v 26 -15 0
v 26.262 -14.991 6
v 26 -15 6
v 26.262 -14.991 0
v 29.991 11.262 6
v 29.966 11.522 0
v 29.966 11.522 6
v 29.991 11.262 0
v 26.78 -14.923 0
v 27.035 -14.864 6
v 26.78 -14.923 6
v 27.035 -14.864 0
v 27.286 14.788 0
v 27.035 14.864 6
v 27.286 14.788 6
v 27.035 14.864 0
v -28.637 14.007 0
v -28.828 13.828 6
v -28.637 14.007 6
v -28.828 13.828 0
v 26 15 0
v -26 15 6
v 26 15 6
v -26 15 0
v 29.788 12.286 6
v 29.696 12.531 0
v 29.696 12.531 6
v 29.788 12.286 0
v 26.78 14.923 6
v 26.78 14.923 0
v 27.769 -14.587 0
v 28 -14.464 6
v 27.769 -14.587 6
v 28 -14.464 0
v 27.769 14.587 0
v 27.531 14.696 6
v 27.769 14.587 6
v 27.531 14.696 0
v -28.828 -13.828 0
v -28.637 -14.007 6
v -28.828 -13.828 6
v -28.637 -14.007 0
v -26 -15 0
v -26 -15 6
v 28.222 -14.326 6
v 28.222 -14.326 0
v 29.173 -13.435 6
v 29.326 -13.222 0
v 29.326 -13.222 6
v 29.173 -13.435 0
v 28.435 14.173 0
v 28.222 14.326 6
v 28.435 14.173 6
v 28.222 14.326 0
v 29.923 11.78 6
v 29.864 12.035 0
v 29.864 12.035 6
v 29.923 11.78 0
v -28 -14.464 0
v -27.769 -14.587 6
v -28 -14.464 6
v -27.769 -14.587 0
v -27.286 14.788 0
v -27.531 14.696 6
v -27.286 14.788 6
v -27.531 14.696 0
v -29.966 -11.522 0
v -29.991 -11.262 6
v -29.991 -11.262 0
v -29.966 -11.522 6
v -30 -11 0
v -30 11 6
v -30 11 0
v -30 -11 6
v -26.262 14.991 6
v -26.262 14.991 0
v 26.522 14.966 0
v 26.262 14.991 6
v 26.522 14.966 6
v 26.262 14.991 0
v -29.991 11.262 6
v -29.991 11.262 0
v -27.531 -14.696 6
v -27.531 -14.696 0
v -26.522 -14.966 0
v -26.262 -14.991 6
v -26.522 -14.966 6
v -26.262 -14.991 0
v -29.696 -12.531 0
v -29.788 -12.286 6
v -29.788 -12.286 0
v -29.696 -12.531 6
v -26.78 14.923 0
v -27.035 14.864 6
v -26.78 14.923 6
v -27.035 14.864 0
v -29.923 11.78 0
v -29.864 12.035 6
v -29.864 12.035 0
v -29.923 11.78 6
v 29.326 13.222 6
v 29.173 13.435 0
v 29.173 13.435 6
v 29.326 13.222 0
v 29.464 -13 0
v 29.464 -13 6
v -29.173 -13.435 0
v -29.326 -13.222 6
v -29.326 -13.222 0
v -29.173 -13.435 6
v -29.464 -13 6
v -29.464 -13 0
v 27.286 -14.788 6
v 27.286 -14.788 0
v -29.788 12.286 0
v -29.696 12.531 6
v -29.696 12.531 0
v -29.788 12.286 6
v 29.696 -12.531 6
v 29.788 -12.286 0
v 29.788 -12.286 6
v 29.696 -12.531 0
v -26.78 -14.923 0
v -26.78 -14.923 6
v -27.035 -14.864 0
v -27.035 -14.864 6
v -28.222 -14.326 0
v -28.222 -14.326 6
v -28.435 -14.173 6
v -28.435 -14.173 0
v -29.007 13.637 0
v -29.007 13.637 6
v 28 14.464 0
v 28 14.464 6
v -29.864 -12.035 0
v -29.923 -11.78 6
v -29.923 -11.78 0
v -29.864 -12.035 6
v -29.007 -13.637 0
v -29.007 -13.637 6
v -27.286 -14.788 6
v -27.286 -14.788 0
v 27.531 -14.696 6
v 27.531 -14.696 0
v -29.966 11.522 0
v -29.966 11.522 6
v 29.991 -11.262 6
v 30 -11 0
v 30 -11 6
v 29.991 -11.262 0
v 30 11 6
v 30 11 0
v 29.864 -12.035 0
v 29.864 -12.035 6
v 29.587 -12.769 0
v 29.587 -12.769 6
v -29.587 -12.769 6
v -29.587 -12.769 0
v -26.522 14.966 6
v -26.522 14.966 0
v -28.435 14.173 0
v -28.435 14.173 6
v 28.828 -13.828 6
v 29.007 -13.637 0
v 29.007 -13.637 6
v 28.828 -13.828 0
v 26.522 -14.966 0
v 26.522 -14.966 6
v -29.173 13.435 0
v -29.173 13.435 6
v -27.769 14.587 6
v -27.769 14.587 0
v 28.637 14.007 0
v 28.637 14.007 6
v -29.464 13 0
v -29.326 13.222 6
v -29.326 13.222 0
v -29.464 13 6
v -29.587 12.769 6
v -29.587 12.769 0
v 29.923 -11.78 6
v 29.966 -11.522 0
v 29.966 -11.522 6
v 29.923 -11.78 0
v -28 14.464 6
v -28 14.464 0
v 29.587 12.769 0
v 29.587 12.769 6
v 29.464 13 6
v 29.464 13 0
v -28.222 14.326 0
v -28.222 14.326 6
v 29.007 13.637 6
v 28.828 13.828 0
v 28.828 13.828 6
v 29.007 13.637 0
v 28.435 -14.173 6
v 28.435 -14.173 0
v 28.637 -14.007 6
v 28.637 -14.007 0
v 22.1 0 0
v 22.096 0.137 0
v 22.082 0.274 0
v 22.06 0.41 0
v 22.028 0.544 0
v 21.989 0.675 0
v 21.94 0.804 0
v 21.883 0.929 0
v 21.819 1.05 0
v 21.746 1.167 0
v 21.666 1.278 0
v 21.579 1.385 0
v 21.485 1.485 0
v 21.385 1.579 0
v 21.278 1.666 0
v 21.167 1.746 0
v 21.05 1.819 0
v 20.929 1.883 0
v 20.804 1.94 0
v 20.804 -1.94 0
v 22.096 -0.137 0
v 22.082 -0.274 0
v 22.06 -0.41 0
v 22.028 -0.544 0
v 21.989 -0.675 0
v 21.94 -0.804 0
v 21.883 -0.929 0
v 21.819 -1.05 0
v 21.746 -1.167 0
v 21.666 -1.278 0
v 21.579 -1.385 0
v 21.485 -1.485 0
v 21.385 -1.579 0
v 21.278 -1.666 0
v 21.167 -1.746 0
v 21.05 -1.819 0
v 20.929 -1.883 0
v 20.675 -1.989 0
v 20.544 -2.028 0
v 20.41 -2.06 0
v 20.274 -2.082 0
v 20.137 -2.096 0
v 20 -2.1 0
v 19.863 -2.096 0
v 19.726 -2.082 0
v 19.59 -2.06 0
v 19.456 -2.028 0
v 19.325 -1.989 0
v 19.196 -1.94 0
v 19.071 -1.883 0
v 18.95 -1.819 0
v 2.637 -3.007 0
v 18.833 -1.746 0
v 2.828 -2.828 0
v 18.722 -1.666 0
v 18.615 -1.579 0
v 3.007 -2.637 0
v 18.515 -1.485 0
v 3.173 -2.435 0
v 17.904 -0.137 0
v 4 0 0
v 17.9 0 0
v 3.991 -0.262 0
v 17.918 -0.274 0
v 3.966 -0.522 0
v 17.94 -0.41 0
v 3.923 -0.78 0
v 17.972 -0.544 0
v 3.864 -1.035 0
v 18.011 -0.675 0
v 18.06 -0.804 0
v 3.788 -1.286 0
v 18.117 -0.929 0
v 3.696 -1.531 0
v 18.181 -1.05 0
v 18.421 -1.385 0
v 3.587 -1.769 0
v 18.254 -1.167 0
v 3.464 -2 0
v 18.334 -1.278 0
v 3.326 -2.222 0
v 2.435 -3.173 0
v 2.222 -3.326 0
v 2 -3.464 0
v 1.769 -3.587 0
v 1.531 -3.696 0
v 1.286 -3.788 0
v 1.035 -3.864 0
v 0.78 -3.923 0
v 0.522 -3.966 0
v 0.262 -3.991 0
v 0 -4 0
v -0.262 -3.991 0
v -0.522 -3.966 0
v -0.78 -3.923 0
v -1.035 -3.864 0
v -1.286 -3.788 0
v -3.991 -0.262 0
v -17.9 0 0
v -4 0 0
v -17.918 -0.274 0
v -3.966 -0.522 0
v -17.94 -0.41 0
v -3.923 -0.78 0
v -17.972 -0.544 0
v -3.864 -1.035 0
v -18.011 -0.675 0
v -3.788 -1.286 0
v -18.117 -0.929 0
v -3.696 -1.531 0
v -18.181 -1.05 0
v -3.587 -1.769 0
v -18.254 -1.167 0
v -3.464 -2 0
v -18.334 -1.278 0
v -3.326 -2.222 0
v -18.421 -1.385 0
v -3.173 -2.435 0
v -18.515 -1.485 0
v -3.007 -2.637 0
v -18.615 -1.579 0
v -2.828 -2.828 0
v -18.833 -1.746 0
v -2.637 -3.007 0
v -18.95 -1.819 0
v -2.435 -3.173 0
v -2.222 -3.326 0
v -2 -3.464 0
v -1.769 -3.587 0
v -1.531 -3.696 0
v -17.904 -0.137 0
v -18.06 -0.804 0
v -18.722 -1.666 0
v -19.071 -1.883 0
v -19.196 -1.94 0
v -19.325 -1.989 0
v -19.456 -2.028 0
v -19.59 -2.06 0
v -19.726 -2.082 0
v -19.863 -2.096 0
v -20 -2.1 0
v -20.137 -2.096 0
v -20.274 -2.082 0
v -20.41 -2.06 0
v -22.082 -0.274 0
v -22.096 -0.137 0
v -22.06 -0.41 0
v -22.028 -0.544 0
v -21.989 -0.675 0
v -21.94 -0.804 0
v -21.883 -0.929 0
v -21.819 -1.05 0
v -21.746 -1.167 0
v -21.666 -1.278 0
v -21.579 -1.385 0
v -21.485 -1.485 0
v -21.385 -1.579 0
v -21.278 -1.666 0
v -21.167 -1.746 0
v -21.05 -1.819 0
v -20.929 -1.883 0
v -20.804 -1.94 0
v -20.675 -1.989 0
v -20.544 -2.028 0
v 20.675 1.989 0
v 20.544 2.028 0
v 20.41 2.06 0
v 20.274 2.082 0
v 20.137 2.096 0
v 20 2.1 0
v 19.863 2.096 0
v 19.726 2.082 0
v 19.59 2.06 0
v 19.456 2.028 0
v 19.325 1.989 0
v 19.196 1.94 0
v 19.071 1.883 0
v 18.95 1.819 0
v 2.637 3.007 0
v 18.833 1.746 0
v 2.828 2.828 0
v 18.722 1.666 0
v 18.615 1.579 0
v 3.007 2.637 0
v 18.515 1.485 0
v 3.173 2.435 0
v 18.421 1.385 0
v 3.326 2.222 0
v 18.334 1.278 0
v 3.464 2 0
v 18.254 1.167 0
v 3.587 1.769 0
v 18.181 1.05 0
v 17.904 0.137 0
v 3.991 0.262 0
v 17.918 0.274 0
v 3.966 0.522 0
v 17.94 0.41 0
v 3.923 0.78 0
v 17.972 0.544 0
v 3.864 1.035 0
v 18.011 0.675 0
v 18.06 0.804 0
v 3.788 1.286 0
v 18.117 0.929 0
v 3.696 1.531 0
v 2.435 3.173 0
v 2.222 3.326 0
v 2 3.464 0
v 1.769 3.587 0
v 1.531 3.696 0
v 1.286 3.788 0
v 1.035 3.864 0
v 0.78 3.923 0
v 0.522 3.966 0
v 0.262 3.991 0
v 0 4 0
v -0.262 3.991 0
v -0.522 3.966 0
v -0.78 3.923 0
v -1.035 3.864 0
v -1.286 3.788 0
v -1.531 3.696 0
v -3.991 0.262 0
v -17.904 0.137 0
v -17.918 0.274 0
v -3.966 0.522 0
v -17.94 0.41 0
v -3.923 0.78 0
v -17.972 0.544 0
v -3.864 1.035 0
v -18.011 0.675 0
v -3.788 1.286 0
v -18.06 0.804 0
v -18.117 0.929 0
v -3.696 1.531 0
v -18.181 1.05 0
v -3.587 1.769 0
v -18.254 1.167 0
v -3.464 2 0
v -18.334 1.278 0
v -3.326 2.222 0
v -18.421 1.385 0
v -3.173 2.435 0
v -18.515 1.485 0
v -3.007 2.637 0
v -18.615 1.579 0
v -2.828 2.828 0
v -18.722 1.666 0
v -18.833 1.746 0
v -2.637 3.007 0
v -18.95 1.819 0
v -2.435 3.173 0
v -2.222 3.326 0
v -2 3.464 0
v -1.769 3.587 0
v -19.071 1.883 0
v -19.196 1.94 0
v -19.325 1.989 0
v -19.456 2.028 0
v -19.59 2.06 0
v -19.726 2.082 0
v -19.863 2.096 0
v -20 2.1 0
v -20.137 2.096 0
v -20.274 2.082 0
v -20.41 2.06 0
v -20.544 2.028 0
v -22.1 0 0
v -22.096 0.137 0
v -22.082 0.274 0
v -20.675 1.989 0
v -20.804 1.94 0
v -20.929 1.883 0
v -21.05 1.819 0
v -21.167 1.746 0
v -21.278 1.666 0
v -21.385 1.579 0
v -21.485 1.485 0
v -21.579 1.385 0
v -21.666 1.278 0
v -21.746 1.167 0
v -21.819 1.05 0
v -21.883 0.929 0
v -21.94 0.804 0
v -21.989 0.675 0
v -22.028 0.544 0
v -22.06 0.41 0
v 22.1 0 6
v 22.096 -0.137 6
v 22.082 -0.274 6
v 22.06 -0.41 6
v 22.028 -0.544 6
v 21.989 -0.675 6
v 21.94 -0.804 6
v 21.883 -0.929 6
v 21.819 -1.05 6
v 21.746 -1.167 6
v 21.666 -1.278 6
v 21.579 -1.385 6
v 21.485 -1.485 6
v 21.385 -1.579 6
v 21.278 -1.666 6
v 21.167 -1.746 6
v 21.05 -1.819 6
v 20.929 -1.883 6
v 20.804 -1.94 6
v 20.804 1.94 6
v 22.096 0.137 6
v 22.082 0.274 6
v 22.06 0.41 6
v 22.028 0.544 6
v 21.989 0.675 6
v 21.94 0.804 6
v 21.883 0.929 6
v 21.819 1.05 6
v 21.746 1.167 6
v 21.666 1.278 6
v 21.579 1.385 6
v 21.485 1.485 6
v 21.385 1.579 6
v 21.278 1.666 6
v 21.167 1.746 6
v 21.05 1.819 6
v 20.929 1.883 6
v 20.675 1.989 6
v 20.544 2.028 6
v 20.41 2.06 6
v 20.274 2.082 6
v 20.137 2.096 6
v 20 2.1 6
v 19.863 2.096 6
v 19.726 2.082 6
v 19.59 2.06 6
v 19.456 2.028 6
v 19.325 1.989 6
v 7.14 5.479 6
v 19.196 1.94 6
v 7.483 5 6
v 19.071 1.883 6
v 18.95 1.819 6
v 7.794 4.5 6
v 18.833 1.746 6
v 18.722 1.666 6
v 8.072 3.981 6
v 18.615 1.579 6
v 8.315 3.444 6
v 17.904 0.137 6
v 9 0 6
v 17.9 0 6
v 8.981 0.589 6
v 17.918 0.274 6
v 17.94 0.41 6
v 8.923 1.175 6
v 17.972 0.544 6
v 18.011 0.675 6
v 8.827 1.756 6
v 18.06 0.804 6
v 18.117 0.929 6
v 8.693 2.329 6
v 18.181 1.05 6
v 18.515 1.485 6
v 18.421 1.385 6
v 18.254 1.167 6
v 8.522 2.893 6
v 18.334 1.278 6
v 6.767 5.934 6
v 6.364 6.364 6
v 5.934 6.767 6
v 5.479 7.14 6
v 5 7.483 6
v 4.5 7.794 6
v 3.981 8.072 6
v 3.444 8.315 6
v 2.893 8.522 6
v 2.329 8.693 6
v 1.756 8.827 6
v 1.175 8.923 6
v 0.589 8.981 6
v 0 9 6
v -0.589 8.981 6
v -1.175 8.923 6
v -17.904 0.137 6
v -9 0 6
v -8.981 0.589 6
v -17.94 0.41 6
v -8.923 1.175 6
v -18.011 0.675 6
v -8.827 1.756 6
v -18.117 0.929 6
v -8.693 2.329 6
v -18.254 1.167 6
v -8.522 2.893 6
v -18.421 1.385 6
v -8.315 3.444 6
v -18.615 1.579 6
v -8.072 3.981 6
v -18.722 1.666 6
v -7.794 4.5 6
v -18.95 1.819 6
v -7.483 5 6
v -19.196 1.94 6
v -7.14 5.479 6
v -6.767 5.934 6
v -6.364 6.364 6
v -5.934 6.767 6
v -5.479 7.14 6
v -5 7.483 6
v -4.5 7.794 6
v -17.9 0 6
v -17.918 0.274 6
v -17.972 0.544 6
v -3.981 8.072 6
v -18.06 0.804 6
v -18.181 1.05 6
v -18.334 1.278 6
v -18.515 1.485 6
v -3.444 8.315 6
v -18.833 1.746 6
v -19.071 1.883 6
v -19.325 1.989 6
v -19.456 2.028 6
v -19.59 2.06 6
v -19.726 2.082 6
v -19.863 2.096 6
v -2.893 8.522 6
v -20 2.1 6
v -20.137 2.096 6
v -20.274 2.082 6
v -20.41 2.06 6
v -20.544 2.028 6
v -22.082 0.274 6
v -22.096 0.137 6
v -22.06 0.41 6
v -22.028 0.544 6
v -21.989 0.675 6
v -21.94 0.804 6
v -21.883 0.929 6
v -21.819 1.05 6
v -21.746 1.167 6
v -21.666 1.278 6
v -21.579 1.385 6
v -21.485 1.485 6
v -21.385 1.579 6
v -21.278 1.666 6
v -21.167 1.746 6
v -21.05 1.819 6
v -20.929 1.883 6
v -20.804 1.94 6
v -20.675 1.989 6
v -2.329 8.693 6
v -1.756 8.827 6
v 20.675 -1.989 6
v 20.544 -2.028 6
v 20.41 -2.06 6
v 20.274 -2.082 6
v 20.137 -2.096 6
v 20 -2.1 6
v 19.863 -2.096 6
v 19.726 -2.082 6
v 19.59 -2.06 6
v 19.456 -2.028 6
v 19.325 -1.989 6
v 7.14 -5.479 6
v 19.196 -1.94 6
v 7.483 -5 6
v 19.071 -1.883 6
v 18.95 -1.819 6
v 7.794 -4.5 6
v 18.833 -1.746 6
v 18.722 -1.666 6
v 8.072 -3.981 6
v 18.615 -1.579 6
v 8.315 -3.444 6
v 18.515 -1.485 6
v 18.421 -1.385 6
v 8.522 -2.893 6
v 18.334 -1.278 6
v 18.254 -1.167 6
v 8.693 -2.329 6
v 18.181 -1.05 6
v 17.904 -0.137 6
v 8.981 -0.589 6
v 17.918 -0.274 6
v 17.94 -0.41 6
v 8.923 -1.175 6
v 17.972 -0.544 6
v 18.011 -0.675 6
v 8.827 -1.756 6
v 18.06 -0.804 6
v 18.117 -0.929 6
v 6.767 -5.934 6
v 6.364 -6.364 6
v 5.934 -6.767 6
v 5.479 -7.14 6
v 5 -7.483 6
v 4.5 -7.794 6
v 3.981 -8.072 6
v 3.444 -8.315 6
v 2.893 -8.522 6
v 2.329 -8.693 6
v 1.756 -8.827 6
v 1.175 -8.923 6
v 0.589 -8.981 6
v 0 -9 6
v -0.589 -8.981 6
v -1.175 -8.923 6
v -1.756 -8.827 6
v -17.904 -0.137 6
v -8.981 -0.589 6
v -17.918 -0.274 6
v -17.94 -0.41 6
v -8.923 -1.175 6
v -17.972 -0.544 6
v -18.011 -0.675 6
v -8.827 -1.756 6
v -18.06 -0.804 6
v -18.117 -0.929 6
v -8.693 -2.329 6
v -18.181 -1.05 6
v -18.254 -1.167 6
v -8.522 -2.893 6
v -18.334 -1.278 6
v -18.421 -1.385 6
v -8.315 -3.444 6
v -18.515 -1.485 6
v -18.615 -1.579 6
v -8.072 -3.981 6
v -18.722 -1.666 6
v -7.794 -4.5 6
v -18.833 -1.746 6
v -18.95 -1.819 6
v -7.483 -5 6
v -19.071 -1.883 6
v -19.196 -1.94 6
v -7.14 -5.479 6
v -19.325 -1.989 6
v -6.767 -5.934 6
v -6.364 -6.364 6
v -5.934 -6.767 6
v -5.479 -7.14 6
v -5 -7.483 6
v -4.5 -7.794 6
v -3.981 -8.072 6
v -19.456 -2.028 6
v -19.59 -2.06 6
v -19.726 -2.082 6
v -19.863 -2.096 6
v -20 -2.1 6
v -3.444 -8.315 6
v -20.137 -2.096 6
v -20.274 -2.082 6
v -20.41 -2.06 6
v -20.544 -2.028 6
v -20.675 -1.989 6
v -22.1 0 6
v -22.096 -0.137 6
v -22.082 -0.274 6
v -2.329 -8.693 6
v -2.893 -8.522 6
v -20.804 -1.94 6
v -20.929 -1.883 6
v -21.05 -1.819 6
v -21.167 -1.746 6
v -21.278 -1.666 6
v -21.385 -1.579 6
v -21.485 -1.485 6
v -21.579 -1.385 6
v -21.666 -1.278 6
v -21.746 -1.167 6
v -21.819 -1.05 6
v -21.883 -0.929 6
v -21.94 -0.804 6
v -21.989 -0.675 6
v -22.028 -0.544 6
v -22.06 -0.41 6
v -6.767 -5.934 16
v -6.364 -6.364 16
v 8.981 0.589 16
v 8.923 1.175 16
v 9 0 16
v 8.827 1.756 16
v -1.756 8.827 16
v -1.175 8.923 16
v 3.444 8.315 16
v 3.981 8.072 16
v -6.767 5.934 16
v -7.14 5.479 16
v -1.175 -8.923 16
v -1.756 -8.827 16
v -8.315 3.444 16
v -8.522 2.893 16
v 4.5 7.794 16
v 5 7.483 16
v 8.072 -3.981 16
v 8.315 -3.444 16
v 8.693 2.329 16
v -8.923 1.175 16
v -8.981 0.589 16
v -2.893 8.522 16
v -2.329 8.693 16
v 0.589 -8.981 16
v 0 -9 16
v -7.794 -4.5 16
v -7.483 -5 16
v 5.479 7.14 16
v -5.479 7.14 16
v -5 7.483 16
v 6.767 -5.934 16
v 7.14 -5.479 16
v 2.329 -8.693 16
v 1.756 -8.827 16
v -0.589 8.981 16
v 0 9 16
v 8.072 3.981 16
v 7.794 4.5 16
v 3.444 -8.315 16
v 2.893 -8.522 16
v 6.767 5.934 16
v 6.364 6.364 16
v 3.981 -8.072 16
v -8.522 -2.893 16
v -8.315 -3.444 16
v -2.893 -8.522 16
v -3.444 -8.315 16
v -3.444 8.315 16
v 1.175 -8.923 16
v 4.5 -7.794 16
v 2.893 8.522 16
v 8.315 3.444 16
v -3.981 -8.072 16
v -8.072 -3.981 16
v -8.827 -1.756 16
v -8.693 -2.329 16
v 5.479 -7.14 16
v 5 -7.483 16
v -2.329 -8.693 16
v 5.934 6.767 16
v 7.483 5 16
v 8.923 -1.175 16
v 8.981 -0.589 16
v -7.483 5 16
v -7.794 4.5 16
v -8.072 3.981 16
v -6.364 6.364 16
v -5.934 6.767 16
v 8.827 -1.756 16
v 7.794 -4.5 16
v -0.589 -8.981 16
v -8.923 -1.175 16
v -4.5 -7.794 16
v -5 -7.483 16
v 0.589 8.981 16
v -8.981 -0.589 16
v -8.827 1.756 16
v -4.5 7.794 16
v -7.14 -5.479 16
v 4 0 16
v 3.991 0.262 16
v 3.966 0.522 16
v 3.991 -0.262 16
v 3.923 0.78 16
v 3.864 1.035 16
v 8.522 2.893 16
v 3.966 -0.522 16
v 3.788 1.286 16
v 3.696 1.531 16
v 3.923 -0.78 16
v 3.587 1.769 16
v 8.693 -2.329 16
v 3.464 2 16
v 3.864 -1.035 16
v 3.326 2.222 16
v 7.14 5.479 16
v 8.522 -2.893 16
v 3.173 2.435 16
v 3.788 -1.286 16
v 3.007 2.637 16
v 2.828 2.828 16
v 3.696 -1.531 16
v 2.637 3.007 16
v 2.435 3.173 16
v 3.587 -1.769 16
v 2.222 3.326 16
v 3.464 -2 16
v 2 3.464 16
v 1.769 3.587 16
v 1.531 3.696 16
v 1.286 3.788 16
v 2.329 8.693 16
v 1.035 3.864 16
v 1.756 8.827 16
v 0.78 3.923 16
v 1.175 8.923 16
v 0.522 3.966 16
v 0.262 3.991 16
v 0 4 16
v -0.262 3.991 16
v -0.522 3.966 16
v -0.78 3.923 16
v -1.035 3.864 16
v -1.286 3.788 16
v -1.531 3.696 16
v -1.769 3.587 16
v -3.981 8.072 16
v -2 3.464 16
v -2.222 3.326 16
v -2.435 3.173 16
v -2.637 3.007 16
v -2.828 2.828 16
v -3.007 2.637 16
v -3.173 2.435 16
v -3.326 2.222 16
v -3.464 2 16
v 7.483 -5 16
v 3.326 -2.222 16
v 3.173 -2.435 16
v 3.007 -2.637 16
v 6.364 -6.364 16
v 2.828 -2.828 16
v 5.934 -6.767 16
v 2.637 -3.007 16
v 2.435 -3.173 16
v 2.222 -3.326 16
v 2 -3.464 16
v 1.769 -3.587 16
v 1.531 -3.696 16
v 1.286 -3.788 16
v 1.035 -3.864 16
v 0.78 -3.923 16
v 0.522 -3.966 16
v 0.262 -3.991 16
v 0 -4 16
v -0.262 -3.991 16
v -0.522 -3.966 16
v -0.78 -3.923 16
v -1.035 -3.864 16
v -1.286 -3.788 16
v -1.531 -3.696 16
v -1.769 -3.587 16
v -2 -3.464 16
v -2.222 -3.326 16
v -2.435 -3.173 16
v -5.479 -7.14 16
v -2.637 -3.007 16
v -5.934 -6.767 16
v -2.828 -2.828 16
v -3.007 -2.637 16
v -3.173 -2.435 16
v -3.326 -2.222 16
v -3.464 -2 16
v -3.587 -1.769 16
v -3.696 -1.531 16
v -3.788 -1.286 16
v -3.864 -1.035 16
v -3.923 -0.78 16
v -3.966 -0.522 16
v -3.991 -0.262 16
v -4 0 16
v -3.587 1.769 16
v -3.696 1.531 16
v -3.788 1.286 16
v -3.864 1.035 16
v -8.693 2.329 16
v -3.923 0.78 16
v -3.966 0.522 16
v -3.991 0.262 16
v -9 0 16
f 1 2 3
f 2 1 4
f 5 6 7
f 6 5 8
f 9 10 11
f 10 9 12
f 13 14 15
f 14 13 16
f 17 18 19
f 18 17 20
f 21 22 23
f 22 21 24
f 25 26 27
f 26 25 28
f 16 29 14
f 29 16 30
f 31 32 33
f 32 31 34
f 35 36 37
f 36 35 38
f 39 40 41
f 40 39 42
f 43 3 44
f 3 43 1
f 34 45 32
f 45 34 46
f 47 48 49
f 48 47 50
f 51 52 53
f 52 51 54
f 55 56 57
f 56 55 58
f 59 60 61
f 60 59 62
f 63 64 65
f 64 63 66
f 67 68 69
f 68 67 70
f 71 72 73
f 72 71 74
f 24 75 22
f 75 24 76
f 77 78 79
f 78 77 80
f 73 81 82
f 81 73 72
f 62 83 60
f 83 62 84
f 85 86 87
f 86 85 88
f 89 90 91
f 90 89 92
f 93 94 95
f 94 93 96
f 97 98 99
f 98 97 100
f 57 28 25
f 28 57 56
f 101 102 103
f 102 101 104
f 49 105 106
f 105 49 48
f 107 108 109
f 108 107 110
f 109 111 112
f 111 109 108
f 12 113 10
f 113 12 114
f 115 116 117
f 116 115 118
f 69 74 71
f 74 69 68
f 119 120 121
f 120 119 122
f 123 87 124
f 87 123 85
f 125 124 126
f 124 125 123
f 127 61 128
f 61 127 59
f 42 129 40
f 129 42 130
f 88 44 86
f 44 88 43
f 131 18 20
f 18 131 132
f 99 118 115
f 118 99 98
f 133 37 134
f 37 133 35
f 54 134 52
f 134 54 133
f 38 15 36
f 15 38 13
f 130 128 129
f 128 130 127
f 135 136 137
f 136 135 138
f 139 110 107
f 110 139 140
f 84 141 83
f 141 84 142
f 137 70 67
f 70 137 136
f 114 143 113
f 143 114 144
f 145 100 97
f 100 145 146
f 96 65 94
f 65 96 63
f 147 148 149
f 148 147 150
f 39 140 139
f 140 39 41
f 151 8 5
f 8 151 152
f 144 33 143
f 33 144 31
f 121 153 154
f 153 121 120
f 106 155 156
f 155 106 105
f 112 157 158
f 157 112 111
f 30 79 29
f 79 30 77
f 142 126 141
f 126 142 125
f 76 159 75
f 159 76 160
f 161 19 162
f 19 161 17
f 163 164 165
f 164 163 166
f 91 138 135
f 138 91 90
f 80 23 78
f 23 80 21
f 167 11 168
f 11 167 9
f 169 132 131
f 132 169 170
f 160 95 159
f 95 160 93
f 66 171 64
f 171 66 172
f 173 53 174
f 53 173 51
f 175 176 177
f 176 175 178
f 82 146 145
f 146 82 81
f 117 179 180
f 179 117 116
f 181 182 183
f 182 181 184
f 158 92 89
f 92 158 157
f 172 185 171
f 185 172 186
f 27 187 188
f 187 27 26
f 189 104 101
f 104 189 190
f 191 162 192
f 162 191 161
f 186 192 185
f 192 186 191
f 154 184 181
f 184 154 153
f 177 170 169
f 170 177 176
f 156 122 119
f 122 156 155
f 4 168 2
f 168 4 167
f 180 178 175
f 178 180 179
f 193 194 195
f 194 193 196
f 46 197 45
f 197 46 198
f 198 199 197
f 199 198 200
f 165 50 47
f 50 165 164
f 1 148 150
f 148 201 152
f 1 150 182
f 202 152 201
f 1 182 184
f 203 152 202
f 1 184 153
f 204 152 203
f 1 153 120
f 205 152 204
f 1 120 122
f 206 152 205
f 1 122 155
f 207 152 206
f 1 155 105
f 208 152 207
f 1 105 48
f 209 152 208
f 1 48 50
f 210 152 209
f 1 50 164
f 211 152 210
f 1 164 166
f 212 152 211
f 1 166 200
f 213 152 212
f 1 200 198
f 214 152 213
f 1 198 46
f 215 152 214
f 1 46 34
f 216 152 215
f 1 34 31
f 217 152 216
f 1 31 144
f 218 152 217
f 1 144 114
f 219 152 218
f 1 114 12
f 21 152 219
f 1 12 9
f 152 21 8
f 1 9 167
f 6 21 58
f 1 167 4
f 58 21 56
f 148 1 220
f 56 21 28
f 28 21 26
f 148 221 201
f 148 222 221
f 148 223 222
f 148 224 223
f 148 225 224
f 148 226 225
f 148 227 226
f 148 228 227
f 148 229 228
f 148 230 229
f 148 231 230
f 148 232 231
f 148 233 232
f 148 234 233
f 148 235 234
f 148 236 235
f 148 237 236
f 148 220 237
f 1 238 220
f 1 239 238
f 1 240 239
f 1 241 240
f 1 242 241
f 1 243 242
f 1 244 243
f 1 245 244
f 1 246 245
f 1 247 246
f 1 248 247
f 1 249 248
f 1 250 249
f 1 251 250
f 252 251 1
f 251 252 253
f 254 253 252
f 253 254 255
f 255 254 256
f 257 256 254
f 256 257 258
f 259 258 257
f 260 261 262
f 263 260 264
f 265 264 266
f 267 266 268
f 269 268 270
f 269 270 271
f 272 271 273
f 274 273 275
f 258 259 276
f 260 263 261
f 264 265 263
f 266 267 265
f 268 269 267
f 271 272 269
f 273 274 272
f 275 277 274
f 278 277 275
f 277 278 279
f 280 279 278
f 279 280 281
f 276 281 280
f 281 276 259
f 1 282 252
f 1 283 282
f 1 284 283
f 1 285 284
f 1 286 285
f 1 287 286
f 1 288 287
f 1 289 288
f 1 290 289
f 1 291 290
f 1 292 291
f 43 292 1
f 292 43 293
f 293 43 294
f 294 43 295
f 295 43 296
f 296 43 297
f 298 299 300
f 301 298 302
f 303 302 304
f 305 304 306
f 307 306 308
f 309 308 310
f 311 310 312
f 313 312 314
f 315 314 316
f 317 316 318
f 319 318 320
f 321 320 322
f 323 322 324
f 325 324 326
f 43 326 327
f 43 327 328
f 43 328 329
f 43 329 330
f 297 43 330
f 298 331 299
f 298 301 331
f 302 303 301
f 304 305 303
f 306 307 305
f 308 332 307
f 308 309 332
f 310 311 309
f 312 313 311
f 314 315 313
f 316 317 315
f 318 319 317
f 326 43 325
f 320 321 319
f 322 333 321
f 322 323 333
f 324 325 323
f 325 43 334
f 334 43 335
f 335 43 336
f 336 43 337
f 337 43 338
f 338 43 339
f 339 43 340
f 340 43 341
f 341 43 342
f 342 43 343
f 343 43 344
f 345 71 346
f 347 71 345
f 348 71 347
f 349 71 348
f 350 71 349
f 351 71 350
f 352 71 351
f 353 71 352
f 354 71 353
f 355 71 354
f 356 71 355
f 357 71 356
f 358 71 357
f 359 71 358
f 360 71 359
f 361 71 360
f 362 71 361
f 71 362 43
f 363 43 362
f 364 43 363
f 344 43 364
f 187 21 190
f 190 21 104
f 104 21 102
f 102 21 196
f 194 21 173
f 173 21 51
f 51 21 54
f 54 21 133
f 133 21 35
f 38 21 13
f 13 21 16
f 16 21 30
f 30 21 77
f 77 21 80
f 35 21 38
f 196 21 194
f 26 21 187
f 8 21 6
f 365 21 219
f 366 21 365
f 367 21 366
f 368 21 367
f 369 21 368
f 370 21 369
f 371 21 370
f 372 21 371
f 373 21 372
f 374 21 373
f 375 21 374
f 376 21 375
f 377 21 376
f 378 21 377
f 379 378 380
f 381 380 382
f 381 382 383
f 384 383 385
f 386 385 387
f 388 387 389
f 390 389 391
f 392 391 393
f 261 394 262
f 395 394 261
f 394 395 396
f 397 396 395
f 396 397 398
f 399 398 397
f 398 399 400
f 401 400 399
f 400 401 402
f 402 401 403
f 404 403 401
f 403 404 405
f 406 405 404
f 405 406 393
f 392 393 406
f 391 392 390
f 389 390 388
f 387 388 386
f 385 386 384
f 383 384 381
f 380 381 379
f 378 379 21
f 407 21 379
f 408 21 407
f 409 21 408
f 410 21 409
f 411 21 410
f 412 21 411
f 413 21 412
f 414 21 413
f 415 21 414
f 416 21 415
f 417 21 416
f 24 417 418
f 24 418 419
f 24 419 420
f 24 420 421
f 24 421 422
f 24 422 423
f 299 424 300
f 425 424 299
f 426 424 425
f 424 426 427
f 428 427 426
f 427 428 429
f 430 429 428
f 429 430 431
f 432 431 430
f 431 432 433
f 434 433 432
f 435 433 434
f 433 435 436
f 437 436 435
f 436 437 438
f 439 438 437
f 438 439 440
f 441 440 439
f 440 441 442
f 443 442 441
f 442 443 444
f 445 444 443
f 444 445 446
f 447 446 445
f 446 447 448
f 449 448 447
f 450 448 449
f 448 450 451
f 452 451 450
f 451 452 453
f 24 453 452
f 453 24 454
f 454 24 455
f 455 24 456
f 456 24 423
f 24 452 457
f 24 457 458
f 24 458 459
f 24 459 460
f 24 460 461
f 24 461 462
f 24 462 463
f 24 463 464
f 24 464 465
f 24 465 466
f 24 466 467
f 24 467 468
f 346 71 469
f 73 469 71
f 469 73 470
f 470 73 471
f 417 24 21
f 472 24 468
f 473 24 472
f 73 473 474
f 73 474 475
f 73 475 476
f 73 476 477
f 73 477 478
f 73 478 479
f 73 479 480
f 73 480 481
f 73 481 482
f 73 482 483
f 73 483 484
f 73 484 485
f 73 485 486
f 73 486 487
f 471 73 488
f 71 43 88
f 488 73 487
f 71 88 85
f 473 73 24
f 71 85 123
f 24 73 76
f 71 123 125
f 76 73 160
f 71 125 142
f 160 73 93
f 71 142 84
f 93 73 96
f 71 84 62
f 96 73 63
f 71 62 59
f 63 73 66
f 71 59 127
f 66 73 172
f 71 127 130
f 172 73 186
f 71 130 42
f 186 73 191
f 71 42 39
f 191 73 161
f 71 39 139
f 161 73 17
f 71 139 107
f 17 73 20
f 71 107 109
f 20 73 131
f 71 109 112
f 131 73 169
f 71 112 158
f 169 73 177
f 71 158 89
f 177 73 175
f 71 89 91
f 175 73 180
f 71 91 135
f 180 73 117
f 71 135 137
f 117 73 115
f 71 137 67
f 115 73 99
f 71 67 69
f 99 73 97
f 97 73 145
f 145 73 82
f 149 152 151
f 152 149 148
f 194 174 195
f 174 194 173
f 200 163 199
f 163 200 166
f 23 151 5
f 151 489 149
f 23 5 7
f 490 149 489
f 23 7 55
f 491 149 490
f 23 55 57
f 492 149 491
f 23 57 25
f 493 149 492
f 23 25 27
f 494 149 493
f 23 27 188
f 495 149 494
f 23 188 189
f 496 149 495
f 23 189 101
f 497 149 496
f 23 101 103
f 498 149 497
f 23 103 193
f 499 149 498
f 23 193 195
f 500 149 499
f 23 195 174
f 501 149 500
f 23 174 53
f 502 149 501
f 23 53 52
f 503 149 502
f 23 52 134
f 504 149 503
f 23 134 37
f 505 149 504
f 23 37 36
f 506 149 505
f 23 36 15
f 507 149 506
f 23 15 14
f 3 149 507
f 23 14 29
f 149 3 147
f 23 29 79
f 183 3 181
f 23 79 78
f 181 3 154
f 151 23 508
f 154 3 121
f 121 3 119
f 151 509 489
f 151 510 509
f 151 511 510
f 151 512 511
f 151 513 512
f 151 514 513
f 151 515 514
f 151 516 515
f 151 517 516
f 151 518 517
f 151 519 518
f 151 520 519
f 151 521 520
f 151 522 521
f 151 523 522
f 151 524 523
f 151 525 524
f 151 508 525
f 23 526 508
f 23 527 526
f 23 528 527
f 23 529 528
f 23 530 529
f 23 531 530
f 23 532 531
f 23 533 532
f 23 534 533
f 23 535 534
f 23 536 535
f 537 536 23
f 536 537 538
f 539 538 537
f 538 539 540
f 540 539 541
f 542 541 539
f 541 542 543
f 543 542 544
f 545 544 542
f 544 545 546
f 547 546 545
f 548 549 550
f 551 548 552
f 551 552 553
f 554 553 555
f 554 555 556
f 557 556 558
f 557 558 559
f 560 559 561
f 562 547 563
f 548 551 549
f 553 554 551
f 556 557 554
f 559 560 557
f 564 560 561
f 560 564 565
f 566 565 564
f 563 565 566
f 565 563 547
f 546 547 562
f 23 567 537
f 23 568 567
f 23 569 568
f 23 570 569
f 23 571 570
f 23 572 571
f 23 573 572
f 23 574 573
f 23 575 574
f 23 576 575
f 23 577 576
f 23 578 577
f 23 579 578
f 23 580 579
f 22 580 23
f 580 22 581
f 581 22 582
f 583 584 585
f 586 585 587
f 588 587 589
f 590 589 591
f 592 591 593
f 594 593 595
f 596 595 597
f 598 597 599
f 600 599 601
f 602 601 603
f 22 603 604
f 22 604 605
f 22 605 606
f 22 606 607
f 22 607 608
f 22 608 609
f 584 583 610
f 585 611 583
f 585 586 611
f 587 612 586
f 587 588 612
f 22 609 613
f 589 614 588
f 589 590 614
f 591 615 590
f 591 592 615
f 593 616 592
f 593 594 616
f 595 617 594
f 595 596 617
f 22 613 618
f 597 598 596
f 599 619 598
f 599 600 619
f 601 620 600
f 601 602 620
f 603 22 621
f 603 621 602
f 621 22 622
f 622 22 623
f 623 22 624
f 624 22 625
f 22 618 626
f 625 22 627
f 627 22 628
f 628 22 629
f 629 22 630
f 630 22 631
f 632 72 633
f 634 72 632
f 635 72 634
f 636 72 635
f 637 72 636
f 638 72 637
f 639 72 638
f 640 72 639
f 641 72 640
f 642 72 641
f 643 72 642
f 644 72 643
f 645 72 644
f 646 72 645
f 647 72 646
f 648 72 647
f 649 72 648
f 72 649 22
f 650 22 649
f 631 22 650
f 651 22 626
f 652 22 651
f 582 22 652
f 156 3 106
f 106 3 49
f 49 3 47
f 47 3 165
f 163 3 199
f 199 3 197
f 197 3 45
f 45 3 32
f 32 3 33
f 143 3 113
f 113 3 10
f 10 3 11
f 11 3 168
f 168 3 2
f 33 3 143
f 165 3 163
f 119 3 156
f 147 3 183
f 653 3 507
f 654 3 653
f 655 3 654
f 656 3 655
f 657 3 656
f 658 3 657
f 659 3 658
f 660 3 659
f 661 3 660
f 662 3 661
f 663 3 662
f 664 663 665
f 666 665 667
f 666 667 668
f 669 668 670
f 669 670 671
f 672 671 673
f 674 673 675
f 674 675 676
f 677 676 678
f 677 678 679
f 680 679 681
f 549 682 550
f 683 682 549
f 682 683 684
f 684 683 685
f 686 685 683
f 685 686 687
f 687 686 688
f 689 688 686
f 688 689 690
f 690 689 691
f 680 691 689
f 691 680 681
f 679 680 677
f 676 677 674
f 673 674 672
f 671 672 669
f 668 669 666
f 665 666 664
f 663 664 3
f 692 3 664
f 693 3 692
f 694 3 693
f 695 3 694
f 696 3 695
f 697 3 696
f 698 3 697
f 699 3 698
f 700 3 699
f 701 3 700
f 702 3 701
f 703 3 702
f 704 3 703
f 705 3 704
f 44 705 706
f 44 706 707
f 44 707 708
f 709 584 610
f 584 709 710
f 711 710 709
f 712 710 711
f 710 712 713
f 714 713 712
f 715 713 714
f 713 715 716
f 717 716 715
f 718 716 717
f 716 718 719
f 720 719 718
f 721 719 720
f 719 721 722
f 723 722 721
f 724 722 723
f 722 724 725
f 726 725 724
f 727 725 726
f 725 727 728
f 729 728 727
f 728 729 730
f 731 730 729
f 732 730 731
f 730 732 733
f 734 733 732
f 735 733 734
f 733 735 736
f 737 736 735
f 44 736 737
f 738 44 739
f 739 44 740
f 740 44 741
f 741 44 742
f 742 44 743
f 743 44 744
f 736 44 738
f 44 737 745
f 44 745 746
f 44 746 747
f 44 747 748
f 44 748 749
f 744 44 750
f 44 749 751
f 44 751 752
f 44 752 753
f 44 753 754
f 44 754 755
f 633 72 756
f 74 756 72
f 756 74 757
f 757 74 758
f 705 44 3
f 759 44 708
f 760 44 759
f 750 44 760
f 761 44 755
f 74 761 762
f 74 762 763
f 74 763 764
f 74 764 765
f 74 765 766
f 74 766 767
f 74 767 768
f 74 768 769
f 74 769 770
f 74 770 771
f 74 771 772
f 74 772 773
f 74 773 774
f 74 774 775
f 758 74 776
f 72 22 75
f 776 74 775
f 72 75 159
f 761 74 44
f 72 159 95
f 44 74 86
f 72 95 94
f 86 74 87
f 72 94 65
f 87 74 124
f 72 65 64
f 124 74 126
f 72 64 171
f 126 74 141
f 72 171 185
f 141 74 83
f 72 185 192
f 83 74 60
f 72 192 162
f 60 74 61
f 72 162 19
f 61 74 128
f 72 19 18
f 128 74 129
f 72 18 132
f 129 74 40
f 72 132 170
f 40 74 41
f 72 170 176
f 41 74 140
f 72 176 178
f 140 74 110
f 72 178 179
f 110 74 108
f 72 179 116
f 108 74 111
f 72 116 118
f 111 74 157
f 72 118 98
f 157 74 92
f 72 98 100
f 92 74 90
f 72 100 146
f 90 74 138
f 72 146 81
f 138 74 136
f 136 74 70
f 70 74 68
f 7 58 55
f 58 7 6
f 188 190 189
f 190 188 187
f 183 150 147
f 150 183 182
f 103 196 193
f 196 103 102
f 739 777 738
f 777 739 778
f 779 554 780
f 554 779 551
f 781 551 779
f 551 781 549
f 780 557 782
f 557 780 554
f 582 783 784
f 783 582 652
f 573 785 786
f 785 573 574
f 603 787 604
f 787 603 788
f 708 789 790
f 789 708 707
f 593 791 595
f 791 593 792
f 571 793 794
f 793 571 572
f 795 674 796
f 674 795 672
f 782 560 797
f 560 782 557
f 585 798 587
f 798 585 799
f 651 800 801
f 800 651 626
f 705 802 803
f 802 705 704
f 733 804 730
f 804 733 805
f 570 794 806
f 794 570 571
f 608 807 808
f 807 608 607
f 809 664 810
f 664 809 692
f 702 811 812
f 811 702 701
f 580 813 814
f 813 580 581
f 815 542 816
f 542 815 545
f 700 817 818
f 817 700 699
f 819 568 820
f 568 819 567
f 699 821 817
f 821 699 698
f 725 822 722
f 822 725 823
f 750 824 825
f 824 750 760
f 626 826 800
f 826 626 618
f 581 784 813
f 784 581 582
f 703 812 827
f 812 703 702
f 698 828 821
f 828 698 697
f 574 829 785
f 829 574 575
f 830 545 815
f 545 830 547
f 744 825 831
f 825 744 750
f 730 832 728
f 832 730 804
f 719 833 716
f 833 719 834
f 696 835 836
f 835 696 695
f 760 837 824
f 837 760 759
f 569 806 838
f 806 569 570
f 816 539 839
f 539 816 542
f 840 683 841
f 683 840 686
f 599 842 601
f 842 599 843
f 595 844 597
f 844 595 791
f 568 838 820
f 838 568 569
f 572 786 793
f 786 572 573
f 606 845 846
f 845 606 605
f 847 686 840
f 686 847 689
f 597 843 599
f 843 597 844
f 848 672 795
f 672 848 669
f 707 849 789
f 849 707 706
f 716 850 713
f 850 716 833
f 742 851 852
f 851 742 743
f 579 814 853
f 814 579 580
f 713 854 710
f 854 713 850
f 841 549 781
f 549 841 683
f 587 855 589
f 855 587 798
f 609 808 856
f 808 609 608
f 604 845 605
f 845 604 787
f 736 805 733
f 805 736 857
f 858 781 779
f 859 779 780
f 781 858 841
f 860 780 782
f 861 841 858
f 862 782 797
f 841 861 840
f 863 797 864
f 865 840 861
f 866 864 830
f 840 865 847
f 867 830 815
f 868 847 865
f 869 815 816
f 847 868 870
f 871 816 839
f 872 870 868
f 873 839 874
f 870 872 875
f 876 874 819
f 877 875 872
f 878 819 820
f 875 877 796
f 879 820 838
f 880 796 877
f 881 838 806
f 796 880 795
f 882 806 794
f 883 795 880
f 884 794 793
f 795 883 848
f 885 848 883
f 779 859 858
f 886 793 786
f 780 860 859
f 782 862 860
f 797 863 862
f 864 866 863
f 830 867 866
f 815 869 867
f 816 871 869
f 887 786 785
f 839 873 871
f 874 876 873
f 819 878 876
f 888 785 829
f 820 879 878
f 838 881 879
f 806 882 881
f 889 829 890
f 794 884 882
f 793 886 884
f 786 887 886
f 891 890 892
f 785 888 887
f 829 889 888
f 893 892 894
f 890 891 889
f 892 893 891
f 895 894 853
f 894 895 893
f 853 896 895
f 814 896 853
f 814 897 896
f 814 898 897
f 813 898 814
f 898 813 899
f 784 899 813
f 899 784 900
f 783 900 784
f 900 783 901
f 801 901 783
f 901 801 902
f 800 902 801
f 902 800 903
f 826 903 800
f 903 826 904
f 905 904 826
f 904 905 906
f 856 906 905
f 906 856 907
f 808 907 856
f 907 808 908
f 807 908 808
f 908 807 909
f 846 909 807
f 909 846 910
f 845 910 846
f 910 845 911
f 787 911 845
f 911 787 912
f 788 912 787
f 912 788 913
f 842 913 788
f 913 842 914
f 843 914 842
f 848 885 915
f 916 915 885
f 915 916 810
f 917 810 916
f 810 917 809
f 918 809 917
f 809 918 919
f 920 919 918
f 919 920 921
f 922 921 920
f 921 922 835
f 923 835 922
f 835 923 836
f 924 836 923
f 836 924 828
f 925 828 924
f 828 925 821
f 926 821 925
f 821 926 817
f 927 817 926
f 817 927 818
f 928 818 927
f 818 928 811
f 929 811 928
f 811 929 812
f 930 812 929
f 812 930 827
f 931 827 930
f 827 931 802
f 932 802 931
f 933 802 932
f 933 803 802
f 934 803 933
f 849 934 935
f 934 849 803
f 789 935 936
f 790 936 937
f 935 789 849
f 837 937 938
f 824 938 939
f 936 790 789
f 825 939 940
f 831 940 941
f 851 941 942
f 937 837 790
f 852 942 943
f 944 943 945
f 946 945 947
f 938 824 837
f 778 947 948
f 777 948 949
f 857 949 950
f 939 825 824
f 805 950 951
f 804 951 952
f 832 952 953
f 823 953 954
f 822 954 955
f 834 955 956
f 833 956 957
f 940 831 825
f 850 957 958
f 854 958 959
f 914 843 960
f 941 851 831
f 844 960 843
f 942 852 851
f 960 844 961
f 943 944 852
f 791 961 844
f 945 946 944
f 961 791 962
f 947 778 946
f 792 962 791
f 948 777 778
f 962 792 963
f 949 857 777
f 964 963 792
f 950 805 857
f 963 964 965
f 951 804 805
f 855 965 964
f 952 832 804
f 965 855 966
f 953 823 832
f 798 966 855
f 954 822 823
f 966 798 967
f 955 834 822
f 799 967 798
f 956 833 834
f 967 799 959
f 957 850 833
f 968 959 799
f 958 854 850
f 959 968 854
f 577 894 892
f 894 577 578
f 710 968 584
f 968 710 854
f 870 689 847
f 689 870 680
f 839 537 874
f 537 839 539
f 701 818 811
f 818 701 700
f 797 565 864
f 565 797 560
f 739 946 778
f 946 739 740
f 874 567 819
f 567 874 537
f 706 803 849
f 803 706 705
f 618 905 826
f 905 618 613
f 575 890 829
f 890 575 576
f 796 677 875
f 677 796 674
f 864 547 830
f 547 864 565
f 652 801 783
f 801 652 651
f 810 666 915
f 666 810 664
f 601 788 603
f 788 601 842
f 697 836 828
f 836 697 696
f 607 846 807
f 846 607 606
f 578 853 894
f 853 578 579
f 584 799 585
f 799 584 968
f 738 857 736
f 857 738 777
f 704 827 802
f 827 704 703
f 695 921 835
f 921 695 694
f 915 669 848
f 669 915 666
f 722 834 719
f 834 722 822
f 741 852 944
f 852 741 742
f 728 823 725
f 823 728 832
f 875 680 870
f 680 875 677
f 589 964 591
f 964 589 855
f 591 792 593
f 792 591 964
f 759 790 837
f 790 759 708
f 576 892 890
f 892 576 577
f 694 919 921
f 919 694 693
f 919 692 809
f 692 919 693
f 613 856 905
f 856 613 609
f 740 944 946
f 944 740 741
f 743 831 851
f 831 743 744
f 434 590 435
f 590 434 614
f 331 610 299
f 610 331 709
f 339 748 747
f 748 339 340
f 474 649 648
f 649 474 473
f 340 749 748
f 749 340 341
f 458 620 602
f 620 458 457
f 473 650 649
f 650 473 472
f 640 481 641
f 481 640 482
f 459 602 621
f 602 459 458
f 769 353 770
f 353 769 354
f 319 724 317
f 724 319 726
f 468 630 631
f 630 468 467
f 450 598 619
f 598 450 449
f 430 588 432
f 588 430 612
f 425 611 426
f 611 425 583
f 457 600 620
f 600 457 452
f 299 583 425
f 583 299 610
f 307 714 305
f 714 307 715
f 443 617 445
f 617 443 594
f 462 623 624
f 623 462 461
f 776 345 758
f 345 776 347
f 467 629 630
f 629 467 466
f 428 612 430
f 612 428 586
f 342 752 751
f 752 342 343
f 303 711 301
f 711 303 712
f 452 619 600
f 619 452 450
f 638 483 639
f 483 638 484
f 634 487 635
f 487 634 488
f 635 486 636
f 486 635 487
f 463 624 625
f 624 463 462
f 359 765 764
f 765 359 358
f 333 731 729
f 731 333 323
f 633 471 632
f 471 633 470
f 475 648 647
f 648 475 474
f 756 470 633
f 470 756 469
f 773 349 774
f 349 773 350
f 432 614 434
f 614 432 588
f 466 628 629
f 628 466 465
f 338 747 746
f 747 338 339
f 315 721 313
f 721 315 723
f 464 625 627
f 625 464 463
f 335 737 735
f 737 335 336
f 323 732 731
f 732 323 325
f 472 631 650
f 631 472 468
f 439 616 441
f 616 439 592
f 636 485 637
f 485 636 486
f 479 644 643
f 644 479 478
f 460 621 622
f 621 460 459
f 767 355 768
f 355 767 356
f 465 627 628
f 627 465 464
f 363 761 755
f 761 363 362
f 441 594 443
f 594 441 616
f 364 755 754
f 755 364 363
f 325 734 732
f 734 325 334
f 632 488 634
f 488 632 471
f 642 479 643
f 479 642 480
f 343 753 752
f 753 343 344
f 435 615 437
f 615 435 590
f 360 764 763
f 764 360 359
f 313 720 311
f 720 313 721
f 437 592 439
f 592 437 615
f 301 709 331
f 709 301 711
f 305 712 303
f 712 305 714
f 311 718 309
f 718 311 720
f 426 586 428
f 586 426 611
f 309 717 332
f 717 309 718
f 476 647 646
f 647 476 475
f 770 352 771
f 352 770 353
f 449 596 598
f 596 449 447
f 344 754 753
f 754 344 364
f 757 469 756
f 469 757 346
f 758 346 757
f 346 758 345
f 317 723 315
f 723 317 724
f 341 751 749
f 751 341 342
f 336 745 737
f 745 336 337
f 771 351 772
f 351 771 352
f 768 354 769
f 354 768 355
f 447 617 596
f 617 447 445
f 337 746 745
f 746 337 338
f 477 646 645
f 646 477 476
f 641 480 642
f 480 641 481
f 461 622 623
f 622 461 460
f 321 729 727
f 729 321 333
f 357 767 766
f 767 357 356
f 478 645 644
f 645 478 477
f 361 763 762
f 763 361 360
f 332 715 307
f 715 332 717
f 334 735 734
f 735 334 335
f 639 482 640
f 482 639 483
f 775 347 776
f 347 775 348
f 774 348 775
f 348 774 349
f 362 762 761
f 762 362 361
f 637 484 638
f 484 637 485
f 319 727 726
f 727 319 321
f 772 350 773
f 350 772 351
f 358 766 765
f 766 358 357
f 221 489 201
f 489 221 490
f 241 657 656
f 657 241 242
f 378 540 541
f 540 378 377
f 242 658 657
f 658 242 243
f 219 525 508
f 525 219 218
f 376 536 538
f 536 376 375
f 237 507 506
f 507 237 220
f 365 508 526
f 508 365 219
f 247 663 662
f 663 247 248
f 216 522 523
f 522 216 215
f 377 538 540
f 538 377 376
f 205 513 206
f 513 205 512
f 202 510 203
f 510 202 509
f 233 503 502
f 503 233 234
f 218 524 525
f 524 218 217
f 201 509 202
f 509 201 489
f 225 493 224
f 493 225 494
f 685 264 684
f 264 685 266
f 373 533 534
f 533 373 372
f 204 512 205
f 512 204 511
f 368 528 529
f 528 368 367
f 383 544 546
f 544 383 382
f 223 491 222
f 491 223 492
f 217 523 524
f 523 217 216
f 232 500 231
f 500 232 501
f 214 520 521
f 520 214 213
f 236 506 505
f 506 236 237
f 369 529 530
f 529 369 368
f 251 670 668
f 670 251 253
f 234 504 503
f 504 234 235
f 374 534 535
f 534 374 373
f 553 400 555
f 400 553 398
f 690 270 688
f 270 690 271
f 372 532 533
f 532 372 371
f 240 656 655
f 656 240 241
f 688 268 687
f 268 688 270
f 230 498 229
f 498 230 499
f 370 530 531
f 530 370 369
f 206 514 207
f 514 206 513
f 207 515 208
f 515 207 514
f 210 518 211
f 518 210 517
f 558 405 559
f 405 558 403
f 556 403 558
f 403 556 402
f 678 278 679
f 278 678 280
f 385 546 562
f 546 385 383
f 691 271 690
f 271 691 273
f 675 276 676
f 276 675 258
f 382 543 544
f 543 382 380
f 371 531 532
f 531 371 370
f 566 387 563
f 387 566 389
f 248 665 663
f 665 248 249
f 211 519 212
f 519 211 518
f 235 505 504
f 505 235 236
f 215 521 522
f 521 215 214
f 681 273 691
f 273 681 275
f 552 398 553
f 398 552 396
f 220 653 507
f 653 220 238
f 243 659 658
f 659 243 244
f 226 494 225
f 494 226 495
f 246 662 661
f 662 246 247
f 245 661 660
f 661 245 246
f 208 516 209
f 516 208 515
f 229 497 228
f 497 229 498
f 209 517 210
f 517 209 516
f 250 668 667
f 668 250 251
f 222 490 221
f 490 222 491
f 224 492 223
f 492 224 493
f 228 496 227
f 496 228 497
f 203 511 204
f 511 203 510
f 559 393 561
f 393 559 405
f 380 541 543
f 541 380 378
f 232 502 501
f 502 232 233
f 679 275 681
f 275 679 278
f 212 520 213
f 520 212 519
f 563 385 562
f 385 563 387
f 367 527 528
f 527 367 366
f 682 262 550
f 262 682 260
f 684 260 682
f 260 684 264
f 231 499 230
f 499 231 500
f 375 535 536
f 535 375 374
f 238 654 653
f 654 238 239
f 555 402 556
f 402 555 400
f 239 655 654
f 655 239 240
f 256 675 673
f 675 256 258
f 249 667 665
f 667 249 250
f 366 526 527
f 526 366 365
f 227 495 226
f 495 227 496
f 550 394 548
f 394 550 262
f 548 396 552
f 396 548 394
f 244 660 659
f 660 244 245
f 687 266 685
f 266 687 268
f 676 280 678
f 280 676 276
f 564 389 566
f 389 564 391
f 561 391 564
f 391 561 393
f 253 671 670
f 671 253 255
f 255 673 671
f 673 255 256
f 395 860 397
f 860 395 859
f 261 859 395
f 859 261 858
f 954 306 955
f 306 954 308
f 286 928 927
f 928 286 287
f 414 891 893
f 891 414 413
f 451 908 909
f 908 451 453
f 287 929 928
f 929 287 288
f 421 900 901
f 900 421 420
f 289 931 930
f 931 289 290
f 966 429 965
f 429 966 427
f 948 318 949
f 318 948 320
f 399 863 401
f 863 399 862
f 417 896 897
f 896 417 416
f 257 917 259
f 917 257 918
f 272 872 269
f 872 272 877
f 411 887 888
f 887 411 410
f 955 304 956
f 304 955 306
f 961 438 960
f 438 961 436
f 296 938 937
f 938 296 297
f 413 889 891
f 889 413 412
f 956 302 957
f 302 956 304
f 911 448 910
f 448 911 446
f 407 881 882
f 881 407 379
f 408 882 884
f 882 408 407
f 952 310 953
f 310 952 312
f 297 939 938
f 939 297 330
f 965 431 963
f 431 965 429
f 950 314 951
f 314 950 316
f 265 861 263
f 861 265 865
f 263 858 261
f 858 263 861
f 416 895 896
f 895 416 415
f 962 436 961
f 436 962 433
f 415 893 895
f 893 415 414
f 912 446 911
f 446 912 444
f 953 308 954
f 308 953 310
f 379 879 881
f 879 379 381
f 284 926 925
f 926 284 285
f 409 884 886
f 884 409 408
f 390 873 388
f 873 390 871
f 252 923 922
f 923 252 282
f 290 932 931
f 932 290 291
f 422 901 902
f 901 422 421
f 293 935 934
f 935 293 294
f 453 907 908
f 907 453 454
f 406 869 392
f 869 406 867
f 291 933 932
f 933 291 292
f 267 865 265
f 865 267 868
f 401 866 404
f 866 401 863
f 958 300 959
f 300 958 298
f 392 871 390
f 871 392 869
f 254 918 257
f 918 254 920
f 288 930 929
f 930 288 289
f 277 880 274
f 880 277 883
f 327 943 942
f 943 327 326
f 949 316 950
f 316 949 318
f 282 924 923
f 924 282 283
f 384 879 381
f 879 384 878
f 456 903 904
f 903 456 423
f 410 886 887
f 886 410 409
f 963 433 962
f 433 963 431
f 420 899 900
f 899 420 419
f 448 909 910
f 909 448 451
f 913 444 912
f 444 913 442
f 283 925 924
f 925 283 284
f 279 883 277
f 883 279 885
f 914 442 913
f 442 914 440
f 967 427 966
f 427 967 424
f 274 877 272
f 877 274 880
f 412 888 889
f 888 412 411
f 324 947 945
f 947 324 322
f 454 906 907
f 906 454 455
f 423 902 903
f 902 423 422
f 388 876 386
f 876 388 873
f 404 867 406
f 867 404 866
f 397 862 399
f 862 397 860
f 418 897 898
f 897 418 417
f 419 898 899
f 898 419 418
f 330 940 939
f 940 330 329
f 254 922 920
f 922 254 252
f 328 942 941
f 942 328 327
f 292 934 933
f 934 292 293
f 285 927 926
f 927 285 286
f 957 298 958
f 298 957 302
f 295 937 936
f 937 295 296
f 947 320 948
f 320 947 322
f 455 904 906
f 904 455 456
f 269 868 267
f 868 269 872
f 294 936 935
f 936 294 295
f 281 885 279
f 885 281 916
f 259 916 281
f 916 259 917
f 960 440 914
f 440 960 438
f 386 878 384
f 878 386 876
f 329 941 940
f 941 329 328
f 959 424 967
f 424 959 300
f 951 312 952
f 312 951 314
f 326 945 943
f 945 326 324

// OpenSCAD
$fn = 96;

module component() {
    // Basic parametric "component" placeholder: a rounded rectangular base
    // with a central boss and two mounting holes.
    base_l = 60;
    base_w = 30;
    base_h = 6;
    corner_r = 4;

    boss_d = 18;
    boss_h = 10;

    hole_d = 4.2;
    hole_spacing = 40;

    difference() {
        union() {
            // Rounded base
            linear_extrude(height = base_h)
                offset(r = corner_r)
                    square([base_l - 2*corner_r, base_w - 2*corner_r], center = true);

            // Central boss
            translate([0, 0, base_h])
                cylinder(d = boss_d, h = boss_h);
        }

        // Mounting holes through base
        for (x = [-hole_spacing/2, hole_spacing/2]) {
            translate([x, 0, -1])
                cylinder(d = hole_d, h = base_h + boss_h + 2);
        }

        // Central clearance hole through boss
        translate([0, 0, -1])
            cylinder(d = 8, h = base_h + boss_h + 2);
    }
}

component();
